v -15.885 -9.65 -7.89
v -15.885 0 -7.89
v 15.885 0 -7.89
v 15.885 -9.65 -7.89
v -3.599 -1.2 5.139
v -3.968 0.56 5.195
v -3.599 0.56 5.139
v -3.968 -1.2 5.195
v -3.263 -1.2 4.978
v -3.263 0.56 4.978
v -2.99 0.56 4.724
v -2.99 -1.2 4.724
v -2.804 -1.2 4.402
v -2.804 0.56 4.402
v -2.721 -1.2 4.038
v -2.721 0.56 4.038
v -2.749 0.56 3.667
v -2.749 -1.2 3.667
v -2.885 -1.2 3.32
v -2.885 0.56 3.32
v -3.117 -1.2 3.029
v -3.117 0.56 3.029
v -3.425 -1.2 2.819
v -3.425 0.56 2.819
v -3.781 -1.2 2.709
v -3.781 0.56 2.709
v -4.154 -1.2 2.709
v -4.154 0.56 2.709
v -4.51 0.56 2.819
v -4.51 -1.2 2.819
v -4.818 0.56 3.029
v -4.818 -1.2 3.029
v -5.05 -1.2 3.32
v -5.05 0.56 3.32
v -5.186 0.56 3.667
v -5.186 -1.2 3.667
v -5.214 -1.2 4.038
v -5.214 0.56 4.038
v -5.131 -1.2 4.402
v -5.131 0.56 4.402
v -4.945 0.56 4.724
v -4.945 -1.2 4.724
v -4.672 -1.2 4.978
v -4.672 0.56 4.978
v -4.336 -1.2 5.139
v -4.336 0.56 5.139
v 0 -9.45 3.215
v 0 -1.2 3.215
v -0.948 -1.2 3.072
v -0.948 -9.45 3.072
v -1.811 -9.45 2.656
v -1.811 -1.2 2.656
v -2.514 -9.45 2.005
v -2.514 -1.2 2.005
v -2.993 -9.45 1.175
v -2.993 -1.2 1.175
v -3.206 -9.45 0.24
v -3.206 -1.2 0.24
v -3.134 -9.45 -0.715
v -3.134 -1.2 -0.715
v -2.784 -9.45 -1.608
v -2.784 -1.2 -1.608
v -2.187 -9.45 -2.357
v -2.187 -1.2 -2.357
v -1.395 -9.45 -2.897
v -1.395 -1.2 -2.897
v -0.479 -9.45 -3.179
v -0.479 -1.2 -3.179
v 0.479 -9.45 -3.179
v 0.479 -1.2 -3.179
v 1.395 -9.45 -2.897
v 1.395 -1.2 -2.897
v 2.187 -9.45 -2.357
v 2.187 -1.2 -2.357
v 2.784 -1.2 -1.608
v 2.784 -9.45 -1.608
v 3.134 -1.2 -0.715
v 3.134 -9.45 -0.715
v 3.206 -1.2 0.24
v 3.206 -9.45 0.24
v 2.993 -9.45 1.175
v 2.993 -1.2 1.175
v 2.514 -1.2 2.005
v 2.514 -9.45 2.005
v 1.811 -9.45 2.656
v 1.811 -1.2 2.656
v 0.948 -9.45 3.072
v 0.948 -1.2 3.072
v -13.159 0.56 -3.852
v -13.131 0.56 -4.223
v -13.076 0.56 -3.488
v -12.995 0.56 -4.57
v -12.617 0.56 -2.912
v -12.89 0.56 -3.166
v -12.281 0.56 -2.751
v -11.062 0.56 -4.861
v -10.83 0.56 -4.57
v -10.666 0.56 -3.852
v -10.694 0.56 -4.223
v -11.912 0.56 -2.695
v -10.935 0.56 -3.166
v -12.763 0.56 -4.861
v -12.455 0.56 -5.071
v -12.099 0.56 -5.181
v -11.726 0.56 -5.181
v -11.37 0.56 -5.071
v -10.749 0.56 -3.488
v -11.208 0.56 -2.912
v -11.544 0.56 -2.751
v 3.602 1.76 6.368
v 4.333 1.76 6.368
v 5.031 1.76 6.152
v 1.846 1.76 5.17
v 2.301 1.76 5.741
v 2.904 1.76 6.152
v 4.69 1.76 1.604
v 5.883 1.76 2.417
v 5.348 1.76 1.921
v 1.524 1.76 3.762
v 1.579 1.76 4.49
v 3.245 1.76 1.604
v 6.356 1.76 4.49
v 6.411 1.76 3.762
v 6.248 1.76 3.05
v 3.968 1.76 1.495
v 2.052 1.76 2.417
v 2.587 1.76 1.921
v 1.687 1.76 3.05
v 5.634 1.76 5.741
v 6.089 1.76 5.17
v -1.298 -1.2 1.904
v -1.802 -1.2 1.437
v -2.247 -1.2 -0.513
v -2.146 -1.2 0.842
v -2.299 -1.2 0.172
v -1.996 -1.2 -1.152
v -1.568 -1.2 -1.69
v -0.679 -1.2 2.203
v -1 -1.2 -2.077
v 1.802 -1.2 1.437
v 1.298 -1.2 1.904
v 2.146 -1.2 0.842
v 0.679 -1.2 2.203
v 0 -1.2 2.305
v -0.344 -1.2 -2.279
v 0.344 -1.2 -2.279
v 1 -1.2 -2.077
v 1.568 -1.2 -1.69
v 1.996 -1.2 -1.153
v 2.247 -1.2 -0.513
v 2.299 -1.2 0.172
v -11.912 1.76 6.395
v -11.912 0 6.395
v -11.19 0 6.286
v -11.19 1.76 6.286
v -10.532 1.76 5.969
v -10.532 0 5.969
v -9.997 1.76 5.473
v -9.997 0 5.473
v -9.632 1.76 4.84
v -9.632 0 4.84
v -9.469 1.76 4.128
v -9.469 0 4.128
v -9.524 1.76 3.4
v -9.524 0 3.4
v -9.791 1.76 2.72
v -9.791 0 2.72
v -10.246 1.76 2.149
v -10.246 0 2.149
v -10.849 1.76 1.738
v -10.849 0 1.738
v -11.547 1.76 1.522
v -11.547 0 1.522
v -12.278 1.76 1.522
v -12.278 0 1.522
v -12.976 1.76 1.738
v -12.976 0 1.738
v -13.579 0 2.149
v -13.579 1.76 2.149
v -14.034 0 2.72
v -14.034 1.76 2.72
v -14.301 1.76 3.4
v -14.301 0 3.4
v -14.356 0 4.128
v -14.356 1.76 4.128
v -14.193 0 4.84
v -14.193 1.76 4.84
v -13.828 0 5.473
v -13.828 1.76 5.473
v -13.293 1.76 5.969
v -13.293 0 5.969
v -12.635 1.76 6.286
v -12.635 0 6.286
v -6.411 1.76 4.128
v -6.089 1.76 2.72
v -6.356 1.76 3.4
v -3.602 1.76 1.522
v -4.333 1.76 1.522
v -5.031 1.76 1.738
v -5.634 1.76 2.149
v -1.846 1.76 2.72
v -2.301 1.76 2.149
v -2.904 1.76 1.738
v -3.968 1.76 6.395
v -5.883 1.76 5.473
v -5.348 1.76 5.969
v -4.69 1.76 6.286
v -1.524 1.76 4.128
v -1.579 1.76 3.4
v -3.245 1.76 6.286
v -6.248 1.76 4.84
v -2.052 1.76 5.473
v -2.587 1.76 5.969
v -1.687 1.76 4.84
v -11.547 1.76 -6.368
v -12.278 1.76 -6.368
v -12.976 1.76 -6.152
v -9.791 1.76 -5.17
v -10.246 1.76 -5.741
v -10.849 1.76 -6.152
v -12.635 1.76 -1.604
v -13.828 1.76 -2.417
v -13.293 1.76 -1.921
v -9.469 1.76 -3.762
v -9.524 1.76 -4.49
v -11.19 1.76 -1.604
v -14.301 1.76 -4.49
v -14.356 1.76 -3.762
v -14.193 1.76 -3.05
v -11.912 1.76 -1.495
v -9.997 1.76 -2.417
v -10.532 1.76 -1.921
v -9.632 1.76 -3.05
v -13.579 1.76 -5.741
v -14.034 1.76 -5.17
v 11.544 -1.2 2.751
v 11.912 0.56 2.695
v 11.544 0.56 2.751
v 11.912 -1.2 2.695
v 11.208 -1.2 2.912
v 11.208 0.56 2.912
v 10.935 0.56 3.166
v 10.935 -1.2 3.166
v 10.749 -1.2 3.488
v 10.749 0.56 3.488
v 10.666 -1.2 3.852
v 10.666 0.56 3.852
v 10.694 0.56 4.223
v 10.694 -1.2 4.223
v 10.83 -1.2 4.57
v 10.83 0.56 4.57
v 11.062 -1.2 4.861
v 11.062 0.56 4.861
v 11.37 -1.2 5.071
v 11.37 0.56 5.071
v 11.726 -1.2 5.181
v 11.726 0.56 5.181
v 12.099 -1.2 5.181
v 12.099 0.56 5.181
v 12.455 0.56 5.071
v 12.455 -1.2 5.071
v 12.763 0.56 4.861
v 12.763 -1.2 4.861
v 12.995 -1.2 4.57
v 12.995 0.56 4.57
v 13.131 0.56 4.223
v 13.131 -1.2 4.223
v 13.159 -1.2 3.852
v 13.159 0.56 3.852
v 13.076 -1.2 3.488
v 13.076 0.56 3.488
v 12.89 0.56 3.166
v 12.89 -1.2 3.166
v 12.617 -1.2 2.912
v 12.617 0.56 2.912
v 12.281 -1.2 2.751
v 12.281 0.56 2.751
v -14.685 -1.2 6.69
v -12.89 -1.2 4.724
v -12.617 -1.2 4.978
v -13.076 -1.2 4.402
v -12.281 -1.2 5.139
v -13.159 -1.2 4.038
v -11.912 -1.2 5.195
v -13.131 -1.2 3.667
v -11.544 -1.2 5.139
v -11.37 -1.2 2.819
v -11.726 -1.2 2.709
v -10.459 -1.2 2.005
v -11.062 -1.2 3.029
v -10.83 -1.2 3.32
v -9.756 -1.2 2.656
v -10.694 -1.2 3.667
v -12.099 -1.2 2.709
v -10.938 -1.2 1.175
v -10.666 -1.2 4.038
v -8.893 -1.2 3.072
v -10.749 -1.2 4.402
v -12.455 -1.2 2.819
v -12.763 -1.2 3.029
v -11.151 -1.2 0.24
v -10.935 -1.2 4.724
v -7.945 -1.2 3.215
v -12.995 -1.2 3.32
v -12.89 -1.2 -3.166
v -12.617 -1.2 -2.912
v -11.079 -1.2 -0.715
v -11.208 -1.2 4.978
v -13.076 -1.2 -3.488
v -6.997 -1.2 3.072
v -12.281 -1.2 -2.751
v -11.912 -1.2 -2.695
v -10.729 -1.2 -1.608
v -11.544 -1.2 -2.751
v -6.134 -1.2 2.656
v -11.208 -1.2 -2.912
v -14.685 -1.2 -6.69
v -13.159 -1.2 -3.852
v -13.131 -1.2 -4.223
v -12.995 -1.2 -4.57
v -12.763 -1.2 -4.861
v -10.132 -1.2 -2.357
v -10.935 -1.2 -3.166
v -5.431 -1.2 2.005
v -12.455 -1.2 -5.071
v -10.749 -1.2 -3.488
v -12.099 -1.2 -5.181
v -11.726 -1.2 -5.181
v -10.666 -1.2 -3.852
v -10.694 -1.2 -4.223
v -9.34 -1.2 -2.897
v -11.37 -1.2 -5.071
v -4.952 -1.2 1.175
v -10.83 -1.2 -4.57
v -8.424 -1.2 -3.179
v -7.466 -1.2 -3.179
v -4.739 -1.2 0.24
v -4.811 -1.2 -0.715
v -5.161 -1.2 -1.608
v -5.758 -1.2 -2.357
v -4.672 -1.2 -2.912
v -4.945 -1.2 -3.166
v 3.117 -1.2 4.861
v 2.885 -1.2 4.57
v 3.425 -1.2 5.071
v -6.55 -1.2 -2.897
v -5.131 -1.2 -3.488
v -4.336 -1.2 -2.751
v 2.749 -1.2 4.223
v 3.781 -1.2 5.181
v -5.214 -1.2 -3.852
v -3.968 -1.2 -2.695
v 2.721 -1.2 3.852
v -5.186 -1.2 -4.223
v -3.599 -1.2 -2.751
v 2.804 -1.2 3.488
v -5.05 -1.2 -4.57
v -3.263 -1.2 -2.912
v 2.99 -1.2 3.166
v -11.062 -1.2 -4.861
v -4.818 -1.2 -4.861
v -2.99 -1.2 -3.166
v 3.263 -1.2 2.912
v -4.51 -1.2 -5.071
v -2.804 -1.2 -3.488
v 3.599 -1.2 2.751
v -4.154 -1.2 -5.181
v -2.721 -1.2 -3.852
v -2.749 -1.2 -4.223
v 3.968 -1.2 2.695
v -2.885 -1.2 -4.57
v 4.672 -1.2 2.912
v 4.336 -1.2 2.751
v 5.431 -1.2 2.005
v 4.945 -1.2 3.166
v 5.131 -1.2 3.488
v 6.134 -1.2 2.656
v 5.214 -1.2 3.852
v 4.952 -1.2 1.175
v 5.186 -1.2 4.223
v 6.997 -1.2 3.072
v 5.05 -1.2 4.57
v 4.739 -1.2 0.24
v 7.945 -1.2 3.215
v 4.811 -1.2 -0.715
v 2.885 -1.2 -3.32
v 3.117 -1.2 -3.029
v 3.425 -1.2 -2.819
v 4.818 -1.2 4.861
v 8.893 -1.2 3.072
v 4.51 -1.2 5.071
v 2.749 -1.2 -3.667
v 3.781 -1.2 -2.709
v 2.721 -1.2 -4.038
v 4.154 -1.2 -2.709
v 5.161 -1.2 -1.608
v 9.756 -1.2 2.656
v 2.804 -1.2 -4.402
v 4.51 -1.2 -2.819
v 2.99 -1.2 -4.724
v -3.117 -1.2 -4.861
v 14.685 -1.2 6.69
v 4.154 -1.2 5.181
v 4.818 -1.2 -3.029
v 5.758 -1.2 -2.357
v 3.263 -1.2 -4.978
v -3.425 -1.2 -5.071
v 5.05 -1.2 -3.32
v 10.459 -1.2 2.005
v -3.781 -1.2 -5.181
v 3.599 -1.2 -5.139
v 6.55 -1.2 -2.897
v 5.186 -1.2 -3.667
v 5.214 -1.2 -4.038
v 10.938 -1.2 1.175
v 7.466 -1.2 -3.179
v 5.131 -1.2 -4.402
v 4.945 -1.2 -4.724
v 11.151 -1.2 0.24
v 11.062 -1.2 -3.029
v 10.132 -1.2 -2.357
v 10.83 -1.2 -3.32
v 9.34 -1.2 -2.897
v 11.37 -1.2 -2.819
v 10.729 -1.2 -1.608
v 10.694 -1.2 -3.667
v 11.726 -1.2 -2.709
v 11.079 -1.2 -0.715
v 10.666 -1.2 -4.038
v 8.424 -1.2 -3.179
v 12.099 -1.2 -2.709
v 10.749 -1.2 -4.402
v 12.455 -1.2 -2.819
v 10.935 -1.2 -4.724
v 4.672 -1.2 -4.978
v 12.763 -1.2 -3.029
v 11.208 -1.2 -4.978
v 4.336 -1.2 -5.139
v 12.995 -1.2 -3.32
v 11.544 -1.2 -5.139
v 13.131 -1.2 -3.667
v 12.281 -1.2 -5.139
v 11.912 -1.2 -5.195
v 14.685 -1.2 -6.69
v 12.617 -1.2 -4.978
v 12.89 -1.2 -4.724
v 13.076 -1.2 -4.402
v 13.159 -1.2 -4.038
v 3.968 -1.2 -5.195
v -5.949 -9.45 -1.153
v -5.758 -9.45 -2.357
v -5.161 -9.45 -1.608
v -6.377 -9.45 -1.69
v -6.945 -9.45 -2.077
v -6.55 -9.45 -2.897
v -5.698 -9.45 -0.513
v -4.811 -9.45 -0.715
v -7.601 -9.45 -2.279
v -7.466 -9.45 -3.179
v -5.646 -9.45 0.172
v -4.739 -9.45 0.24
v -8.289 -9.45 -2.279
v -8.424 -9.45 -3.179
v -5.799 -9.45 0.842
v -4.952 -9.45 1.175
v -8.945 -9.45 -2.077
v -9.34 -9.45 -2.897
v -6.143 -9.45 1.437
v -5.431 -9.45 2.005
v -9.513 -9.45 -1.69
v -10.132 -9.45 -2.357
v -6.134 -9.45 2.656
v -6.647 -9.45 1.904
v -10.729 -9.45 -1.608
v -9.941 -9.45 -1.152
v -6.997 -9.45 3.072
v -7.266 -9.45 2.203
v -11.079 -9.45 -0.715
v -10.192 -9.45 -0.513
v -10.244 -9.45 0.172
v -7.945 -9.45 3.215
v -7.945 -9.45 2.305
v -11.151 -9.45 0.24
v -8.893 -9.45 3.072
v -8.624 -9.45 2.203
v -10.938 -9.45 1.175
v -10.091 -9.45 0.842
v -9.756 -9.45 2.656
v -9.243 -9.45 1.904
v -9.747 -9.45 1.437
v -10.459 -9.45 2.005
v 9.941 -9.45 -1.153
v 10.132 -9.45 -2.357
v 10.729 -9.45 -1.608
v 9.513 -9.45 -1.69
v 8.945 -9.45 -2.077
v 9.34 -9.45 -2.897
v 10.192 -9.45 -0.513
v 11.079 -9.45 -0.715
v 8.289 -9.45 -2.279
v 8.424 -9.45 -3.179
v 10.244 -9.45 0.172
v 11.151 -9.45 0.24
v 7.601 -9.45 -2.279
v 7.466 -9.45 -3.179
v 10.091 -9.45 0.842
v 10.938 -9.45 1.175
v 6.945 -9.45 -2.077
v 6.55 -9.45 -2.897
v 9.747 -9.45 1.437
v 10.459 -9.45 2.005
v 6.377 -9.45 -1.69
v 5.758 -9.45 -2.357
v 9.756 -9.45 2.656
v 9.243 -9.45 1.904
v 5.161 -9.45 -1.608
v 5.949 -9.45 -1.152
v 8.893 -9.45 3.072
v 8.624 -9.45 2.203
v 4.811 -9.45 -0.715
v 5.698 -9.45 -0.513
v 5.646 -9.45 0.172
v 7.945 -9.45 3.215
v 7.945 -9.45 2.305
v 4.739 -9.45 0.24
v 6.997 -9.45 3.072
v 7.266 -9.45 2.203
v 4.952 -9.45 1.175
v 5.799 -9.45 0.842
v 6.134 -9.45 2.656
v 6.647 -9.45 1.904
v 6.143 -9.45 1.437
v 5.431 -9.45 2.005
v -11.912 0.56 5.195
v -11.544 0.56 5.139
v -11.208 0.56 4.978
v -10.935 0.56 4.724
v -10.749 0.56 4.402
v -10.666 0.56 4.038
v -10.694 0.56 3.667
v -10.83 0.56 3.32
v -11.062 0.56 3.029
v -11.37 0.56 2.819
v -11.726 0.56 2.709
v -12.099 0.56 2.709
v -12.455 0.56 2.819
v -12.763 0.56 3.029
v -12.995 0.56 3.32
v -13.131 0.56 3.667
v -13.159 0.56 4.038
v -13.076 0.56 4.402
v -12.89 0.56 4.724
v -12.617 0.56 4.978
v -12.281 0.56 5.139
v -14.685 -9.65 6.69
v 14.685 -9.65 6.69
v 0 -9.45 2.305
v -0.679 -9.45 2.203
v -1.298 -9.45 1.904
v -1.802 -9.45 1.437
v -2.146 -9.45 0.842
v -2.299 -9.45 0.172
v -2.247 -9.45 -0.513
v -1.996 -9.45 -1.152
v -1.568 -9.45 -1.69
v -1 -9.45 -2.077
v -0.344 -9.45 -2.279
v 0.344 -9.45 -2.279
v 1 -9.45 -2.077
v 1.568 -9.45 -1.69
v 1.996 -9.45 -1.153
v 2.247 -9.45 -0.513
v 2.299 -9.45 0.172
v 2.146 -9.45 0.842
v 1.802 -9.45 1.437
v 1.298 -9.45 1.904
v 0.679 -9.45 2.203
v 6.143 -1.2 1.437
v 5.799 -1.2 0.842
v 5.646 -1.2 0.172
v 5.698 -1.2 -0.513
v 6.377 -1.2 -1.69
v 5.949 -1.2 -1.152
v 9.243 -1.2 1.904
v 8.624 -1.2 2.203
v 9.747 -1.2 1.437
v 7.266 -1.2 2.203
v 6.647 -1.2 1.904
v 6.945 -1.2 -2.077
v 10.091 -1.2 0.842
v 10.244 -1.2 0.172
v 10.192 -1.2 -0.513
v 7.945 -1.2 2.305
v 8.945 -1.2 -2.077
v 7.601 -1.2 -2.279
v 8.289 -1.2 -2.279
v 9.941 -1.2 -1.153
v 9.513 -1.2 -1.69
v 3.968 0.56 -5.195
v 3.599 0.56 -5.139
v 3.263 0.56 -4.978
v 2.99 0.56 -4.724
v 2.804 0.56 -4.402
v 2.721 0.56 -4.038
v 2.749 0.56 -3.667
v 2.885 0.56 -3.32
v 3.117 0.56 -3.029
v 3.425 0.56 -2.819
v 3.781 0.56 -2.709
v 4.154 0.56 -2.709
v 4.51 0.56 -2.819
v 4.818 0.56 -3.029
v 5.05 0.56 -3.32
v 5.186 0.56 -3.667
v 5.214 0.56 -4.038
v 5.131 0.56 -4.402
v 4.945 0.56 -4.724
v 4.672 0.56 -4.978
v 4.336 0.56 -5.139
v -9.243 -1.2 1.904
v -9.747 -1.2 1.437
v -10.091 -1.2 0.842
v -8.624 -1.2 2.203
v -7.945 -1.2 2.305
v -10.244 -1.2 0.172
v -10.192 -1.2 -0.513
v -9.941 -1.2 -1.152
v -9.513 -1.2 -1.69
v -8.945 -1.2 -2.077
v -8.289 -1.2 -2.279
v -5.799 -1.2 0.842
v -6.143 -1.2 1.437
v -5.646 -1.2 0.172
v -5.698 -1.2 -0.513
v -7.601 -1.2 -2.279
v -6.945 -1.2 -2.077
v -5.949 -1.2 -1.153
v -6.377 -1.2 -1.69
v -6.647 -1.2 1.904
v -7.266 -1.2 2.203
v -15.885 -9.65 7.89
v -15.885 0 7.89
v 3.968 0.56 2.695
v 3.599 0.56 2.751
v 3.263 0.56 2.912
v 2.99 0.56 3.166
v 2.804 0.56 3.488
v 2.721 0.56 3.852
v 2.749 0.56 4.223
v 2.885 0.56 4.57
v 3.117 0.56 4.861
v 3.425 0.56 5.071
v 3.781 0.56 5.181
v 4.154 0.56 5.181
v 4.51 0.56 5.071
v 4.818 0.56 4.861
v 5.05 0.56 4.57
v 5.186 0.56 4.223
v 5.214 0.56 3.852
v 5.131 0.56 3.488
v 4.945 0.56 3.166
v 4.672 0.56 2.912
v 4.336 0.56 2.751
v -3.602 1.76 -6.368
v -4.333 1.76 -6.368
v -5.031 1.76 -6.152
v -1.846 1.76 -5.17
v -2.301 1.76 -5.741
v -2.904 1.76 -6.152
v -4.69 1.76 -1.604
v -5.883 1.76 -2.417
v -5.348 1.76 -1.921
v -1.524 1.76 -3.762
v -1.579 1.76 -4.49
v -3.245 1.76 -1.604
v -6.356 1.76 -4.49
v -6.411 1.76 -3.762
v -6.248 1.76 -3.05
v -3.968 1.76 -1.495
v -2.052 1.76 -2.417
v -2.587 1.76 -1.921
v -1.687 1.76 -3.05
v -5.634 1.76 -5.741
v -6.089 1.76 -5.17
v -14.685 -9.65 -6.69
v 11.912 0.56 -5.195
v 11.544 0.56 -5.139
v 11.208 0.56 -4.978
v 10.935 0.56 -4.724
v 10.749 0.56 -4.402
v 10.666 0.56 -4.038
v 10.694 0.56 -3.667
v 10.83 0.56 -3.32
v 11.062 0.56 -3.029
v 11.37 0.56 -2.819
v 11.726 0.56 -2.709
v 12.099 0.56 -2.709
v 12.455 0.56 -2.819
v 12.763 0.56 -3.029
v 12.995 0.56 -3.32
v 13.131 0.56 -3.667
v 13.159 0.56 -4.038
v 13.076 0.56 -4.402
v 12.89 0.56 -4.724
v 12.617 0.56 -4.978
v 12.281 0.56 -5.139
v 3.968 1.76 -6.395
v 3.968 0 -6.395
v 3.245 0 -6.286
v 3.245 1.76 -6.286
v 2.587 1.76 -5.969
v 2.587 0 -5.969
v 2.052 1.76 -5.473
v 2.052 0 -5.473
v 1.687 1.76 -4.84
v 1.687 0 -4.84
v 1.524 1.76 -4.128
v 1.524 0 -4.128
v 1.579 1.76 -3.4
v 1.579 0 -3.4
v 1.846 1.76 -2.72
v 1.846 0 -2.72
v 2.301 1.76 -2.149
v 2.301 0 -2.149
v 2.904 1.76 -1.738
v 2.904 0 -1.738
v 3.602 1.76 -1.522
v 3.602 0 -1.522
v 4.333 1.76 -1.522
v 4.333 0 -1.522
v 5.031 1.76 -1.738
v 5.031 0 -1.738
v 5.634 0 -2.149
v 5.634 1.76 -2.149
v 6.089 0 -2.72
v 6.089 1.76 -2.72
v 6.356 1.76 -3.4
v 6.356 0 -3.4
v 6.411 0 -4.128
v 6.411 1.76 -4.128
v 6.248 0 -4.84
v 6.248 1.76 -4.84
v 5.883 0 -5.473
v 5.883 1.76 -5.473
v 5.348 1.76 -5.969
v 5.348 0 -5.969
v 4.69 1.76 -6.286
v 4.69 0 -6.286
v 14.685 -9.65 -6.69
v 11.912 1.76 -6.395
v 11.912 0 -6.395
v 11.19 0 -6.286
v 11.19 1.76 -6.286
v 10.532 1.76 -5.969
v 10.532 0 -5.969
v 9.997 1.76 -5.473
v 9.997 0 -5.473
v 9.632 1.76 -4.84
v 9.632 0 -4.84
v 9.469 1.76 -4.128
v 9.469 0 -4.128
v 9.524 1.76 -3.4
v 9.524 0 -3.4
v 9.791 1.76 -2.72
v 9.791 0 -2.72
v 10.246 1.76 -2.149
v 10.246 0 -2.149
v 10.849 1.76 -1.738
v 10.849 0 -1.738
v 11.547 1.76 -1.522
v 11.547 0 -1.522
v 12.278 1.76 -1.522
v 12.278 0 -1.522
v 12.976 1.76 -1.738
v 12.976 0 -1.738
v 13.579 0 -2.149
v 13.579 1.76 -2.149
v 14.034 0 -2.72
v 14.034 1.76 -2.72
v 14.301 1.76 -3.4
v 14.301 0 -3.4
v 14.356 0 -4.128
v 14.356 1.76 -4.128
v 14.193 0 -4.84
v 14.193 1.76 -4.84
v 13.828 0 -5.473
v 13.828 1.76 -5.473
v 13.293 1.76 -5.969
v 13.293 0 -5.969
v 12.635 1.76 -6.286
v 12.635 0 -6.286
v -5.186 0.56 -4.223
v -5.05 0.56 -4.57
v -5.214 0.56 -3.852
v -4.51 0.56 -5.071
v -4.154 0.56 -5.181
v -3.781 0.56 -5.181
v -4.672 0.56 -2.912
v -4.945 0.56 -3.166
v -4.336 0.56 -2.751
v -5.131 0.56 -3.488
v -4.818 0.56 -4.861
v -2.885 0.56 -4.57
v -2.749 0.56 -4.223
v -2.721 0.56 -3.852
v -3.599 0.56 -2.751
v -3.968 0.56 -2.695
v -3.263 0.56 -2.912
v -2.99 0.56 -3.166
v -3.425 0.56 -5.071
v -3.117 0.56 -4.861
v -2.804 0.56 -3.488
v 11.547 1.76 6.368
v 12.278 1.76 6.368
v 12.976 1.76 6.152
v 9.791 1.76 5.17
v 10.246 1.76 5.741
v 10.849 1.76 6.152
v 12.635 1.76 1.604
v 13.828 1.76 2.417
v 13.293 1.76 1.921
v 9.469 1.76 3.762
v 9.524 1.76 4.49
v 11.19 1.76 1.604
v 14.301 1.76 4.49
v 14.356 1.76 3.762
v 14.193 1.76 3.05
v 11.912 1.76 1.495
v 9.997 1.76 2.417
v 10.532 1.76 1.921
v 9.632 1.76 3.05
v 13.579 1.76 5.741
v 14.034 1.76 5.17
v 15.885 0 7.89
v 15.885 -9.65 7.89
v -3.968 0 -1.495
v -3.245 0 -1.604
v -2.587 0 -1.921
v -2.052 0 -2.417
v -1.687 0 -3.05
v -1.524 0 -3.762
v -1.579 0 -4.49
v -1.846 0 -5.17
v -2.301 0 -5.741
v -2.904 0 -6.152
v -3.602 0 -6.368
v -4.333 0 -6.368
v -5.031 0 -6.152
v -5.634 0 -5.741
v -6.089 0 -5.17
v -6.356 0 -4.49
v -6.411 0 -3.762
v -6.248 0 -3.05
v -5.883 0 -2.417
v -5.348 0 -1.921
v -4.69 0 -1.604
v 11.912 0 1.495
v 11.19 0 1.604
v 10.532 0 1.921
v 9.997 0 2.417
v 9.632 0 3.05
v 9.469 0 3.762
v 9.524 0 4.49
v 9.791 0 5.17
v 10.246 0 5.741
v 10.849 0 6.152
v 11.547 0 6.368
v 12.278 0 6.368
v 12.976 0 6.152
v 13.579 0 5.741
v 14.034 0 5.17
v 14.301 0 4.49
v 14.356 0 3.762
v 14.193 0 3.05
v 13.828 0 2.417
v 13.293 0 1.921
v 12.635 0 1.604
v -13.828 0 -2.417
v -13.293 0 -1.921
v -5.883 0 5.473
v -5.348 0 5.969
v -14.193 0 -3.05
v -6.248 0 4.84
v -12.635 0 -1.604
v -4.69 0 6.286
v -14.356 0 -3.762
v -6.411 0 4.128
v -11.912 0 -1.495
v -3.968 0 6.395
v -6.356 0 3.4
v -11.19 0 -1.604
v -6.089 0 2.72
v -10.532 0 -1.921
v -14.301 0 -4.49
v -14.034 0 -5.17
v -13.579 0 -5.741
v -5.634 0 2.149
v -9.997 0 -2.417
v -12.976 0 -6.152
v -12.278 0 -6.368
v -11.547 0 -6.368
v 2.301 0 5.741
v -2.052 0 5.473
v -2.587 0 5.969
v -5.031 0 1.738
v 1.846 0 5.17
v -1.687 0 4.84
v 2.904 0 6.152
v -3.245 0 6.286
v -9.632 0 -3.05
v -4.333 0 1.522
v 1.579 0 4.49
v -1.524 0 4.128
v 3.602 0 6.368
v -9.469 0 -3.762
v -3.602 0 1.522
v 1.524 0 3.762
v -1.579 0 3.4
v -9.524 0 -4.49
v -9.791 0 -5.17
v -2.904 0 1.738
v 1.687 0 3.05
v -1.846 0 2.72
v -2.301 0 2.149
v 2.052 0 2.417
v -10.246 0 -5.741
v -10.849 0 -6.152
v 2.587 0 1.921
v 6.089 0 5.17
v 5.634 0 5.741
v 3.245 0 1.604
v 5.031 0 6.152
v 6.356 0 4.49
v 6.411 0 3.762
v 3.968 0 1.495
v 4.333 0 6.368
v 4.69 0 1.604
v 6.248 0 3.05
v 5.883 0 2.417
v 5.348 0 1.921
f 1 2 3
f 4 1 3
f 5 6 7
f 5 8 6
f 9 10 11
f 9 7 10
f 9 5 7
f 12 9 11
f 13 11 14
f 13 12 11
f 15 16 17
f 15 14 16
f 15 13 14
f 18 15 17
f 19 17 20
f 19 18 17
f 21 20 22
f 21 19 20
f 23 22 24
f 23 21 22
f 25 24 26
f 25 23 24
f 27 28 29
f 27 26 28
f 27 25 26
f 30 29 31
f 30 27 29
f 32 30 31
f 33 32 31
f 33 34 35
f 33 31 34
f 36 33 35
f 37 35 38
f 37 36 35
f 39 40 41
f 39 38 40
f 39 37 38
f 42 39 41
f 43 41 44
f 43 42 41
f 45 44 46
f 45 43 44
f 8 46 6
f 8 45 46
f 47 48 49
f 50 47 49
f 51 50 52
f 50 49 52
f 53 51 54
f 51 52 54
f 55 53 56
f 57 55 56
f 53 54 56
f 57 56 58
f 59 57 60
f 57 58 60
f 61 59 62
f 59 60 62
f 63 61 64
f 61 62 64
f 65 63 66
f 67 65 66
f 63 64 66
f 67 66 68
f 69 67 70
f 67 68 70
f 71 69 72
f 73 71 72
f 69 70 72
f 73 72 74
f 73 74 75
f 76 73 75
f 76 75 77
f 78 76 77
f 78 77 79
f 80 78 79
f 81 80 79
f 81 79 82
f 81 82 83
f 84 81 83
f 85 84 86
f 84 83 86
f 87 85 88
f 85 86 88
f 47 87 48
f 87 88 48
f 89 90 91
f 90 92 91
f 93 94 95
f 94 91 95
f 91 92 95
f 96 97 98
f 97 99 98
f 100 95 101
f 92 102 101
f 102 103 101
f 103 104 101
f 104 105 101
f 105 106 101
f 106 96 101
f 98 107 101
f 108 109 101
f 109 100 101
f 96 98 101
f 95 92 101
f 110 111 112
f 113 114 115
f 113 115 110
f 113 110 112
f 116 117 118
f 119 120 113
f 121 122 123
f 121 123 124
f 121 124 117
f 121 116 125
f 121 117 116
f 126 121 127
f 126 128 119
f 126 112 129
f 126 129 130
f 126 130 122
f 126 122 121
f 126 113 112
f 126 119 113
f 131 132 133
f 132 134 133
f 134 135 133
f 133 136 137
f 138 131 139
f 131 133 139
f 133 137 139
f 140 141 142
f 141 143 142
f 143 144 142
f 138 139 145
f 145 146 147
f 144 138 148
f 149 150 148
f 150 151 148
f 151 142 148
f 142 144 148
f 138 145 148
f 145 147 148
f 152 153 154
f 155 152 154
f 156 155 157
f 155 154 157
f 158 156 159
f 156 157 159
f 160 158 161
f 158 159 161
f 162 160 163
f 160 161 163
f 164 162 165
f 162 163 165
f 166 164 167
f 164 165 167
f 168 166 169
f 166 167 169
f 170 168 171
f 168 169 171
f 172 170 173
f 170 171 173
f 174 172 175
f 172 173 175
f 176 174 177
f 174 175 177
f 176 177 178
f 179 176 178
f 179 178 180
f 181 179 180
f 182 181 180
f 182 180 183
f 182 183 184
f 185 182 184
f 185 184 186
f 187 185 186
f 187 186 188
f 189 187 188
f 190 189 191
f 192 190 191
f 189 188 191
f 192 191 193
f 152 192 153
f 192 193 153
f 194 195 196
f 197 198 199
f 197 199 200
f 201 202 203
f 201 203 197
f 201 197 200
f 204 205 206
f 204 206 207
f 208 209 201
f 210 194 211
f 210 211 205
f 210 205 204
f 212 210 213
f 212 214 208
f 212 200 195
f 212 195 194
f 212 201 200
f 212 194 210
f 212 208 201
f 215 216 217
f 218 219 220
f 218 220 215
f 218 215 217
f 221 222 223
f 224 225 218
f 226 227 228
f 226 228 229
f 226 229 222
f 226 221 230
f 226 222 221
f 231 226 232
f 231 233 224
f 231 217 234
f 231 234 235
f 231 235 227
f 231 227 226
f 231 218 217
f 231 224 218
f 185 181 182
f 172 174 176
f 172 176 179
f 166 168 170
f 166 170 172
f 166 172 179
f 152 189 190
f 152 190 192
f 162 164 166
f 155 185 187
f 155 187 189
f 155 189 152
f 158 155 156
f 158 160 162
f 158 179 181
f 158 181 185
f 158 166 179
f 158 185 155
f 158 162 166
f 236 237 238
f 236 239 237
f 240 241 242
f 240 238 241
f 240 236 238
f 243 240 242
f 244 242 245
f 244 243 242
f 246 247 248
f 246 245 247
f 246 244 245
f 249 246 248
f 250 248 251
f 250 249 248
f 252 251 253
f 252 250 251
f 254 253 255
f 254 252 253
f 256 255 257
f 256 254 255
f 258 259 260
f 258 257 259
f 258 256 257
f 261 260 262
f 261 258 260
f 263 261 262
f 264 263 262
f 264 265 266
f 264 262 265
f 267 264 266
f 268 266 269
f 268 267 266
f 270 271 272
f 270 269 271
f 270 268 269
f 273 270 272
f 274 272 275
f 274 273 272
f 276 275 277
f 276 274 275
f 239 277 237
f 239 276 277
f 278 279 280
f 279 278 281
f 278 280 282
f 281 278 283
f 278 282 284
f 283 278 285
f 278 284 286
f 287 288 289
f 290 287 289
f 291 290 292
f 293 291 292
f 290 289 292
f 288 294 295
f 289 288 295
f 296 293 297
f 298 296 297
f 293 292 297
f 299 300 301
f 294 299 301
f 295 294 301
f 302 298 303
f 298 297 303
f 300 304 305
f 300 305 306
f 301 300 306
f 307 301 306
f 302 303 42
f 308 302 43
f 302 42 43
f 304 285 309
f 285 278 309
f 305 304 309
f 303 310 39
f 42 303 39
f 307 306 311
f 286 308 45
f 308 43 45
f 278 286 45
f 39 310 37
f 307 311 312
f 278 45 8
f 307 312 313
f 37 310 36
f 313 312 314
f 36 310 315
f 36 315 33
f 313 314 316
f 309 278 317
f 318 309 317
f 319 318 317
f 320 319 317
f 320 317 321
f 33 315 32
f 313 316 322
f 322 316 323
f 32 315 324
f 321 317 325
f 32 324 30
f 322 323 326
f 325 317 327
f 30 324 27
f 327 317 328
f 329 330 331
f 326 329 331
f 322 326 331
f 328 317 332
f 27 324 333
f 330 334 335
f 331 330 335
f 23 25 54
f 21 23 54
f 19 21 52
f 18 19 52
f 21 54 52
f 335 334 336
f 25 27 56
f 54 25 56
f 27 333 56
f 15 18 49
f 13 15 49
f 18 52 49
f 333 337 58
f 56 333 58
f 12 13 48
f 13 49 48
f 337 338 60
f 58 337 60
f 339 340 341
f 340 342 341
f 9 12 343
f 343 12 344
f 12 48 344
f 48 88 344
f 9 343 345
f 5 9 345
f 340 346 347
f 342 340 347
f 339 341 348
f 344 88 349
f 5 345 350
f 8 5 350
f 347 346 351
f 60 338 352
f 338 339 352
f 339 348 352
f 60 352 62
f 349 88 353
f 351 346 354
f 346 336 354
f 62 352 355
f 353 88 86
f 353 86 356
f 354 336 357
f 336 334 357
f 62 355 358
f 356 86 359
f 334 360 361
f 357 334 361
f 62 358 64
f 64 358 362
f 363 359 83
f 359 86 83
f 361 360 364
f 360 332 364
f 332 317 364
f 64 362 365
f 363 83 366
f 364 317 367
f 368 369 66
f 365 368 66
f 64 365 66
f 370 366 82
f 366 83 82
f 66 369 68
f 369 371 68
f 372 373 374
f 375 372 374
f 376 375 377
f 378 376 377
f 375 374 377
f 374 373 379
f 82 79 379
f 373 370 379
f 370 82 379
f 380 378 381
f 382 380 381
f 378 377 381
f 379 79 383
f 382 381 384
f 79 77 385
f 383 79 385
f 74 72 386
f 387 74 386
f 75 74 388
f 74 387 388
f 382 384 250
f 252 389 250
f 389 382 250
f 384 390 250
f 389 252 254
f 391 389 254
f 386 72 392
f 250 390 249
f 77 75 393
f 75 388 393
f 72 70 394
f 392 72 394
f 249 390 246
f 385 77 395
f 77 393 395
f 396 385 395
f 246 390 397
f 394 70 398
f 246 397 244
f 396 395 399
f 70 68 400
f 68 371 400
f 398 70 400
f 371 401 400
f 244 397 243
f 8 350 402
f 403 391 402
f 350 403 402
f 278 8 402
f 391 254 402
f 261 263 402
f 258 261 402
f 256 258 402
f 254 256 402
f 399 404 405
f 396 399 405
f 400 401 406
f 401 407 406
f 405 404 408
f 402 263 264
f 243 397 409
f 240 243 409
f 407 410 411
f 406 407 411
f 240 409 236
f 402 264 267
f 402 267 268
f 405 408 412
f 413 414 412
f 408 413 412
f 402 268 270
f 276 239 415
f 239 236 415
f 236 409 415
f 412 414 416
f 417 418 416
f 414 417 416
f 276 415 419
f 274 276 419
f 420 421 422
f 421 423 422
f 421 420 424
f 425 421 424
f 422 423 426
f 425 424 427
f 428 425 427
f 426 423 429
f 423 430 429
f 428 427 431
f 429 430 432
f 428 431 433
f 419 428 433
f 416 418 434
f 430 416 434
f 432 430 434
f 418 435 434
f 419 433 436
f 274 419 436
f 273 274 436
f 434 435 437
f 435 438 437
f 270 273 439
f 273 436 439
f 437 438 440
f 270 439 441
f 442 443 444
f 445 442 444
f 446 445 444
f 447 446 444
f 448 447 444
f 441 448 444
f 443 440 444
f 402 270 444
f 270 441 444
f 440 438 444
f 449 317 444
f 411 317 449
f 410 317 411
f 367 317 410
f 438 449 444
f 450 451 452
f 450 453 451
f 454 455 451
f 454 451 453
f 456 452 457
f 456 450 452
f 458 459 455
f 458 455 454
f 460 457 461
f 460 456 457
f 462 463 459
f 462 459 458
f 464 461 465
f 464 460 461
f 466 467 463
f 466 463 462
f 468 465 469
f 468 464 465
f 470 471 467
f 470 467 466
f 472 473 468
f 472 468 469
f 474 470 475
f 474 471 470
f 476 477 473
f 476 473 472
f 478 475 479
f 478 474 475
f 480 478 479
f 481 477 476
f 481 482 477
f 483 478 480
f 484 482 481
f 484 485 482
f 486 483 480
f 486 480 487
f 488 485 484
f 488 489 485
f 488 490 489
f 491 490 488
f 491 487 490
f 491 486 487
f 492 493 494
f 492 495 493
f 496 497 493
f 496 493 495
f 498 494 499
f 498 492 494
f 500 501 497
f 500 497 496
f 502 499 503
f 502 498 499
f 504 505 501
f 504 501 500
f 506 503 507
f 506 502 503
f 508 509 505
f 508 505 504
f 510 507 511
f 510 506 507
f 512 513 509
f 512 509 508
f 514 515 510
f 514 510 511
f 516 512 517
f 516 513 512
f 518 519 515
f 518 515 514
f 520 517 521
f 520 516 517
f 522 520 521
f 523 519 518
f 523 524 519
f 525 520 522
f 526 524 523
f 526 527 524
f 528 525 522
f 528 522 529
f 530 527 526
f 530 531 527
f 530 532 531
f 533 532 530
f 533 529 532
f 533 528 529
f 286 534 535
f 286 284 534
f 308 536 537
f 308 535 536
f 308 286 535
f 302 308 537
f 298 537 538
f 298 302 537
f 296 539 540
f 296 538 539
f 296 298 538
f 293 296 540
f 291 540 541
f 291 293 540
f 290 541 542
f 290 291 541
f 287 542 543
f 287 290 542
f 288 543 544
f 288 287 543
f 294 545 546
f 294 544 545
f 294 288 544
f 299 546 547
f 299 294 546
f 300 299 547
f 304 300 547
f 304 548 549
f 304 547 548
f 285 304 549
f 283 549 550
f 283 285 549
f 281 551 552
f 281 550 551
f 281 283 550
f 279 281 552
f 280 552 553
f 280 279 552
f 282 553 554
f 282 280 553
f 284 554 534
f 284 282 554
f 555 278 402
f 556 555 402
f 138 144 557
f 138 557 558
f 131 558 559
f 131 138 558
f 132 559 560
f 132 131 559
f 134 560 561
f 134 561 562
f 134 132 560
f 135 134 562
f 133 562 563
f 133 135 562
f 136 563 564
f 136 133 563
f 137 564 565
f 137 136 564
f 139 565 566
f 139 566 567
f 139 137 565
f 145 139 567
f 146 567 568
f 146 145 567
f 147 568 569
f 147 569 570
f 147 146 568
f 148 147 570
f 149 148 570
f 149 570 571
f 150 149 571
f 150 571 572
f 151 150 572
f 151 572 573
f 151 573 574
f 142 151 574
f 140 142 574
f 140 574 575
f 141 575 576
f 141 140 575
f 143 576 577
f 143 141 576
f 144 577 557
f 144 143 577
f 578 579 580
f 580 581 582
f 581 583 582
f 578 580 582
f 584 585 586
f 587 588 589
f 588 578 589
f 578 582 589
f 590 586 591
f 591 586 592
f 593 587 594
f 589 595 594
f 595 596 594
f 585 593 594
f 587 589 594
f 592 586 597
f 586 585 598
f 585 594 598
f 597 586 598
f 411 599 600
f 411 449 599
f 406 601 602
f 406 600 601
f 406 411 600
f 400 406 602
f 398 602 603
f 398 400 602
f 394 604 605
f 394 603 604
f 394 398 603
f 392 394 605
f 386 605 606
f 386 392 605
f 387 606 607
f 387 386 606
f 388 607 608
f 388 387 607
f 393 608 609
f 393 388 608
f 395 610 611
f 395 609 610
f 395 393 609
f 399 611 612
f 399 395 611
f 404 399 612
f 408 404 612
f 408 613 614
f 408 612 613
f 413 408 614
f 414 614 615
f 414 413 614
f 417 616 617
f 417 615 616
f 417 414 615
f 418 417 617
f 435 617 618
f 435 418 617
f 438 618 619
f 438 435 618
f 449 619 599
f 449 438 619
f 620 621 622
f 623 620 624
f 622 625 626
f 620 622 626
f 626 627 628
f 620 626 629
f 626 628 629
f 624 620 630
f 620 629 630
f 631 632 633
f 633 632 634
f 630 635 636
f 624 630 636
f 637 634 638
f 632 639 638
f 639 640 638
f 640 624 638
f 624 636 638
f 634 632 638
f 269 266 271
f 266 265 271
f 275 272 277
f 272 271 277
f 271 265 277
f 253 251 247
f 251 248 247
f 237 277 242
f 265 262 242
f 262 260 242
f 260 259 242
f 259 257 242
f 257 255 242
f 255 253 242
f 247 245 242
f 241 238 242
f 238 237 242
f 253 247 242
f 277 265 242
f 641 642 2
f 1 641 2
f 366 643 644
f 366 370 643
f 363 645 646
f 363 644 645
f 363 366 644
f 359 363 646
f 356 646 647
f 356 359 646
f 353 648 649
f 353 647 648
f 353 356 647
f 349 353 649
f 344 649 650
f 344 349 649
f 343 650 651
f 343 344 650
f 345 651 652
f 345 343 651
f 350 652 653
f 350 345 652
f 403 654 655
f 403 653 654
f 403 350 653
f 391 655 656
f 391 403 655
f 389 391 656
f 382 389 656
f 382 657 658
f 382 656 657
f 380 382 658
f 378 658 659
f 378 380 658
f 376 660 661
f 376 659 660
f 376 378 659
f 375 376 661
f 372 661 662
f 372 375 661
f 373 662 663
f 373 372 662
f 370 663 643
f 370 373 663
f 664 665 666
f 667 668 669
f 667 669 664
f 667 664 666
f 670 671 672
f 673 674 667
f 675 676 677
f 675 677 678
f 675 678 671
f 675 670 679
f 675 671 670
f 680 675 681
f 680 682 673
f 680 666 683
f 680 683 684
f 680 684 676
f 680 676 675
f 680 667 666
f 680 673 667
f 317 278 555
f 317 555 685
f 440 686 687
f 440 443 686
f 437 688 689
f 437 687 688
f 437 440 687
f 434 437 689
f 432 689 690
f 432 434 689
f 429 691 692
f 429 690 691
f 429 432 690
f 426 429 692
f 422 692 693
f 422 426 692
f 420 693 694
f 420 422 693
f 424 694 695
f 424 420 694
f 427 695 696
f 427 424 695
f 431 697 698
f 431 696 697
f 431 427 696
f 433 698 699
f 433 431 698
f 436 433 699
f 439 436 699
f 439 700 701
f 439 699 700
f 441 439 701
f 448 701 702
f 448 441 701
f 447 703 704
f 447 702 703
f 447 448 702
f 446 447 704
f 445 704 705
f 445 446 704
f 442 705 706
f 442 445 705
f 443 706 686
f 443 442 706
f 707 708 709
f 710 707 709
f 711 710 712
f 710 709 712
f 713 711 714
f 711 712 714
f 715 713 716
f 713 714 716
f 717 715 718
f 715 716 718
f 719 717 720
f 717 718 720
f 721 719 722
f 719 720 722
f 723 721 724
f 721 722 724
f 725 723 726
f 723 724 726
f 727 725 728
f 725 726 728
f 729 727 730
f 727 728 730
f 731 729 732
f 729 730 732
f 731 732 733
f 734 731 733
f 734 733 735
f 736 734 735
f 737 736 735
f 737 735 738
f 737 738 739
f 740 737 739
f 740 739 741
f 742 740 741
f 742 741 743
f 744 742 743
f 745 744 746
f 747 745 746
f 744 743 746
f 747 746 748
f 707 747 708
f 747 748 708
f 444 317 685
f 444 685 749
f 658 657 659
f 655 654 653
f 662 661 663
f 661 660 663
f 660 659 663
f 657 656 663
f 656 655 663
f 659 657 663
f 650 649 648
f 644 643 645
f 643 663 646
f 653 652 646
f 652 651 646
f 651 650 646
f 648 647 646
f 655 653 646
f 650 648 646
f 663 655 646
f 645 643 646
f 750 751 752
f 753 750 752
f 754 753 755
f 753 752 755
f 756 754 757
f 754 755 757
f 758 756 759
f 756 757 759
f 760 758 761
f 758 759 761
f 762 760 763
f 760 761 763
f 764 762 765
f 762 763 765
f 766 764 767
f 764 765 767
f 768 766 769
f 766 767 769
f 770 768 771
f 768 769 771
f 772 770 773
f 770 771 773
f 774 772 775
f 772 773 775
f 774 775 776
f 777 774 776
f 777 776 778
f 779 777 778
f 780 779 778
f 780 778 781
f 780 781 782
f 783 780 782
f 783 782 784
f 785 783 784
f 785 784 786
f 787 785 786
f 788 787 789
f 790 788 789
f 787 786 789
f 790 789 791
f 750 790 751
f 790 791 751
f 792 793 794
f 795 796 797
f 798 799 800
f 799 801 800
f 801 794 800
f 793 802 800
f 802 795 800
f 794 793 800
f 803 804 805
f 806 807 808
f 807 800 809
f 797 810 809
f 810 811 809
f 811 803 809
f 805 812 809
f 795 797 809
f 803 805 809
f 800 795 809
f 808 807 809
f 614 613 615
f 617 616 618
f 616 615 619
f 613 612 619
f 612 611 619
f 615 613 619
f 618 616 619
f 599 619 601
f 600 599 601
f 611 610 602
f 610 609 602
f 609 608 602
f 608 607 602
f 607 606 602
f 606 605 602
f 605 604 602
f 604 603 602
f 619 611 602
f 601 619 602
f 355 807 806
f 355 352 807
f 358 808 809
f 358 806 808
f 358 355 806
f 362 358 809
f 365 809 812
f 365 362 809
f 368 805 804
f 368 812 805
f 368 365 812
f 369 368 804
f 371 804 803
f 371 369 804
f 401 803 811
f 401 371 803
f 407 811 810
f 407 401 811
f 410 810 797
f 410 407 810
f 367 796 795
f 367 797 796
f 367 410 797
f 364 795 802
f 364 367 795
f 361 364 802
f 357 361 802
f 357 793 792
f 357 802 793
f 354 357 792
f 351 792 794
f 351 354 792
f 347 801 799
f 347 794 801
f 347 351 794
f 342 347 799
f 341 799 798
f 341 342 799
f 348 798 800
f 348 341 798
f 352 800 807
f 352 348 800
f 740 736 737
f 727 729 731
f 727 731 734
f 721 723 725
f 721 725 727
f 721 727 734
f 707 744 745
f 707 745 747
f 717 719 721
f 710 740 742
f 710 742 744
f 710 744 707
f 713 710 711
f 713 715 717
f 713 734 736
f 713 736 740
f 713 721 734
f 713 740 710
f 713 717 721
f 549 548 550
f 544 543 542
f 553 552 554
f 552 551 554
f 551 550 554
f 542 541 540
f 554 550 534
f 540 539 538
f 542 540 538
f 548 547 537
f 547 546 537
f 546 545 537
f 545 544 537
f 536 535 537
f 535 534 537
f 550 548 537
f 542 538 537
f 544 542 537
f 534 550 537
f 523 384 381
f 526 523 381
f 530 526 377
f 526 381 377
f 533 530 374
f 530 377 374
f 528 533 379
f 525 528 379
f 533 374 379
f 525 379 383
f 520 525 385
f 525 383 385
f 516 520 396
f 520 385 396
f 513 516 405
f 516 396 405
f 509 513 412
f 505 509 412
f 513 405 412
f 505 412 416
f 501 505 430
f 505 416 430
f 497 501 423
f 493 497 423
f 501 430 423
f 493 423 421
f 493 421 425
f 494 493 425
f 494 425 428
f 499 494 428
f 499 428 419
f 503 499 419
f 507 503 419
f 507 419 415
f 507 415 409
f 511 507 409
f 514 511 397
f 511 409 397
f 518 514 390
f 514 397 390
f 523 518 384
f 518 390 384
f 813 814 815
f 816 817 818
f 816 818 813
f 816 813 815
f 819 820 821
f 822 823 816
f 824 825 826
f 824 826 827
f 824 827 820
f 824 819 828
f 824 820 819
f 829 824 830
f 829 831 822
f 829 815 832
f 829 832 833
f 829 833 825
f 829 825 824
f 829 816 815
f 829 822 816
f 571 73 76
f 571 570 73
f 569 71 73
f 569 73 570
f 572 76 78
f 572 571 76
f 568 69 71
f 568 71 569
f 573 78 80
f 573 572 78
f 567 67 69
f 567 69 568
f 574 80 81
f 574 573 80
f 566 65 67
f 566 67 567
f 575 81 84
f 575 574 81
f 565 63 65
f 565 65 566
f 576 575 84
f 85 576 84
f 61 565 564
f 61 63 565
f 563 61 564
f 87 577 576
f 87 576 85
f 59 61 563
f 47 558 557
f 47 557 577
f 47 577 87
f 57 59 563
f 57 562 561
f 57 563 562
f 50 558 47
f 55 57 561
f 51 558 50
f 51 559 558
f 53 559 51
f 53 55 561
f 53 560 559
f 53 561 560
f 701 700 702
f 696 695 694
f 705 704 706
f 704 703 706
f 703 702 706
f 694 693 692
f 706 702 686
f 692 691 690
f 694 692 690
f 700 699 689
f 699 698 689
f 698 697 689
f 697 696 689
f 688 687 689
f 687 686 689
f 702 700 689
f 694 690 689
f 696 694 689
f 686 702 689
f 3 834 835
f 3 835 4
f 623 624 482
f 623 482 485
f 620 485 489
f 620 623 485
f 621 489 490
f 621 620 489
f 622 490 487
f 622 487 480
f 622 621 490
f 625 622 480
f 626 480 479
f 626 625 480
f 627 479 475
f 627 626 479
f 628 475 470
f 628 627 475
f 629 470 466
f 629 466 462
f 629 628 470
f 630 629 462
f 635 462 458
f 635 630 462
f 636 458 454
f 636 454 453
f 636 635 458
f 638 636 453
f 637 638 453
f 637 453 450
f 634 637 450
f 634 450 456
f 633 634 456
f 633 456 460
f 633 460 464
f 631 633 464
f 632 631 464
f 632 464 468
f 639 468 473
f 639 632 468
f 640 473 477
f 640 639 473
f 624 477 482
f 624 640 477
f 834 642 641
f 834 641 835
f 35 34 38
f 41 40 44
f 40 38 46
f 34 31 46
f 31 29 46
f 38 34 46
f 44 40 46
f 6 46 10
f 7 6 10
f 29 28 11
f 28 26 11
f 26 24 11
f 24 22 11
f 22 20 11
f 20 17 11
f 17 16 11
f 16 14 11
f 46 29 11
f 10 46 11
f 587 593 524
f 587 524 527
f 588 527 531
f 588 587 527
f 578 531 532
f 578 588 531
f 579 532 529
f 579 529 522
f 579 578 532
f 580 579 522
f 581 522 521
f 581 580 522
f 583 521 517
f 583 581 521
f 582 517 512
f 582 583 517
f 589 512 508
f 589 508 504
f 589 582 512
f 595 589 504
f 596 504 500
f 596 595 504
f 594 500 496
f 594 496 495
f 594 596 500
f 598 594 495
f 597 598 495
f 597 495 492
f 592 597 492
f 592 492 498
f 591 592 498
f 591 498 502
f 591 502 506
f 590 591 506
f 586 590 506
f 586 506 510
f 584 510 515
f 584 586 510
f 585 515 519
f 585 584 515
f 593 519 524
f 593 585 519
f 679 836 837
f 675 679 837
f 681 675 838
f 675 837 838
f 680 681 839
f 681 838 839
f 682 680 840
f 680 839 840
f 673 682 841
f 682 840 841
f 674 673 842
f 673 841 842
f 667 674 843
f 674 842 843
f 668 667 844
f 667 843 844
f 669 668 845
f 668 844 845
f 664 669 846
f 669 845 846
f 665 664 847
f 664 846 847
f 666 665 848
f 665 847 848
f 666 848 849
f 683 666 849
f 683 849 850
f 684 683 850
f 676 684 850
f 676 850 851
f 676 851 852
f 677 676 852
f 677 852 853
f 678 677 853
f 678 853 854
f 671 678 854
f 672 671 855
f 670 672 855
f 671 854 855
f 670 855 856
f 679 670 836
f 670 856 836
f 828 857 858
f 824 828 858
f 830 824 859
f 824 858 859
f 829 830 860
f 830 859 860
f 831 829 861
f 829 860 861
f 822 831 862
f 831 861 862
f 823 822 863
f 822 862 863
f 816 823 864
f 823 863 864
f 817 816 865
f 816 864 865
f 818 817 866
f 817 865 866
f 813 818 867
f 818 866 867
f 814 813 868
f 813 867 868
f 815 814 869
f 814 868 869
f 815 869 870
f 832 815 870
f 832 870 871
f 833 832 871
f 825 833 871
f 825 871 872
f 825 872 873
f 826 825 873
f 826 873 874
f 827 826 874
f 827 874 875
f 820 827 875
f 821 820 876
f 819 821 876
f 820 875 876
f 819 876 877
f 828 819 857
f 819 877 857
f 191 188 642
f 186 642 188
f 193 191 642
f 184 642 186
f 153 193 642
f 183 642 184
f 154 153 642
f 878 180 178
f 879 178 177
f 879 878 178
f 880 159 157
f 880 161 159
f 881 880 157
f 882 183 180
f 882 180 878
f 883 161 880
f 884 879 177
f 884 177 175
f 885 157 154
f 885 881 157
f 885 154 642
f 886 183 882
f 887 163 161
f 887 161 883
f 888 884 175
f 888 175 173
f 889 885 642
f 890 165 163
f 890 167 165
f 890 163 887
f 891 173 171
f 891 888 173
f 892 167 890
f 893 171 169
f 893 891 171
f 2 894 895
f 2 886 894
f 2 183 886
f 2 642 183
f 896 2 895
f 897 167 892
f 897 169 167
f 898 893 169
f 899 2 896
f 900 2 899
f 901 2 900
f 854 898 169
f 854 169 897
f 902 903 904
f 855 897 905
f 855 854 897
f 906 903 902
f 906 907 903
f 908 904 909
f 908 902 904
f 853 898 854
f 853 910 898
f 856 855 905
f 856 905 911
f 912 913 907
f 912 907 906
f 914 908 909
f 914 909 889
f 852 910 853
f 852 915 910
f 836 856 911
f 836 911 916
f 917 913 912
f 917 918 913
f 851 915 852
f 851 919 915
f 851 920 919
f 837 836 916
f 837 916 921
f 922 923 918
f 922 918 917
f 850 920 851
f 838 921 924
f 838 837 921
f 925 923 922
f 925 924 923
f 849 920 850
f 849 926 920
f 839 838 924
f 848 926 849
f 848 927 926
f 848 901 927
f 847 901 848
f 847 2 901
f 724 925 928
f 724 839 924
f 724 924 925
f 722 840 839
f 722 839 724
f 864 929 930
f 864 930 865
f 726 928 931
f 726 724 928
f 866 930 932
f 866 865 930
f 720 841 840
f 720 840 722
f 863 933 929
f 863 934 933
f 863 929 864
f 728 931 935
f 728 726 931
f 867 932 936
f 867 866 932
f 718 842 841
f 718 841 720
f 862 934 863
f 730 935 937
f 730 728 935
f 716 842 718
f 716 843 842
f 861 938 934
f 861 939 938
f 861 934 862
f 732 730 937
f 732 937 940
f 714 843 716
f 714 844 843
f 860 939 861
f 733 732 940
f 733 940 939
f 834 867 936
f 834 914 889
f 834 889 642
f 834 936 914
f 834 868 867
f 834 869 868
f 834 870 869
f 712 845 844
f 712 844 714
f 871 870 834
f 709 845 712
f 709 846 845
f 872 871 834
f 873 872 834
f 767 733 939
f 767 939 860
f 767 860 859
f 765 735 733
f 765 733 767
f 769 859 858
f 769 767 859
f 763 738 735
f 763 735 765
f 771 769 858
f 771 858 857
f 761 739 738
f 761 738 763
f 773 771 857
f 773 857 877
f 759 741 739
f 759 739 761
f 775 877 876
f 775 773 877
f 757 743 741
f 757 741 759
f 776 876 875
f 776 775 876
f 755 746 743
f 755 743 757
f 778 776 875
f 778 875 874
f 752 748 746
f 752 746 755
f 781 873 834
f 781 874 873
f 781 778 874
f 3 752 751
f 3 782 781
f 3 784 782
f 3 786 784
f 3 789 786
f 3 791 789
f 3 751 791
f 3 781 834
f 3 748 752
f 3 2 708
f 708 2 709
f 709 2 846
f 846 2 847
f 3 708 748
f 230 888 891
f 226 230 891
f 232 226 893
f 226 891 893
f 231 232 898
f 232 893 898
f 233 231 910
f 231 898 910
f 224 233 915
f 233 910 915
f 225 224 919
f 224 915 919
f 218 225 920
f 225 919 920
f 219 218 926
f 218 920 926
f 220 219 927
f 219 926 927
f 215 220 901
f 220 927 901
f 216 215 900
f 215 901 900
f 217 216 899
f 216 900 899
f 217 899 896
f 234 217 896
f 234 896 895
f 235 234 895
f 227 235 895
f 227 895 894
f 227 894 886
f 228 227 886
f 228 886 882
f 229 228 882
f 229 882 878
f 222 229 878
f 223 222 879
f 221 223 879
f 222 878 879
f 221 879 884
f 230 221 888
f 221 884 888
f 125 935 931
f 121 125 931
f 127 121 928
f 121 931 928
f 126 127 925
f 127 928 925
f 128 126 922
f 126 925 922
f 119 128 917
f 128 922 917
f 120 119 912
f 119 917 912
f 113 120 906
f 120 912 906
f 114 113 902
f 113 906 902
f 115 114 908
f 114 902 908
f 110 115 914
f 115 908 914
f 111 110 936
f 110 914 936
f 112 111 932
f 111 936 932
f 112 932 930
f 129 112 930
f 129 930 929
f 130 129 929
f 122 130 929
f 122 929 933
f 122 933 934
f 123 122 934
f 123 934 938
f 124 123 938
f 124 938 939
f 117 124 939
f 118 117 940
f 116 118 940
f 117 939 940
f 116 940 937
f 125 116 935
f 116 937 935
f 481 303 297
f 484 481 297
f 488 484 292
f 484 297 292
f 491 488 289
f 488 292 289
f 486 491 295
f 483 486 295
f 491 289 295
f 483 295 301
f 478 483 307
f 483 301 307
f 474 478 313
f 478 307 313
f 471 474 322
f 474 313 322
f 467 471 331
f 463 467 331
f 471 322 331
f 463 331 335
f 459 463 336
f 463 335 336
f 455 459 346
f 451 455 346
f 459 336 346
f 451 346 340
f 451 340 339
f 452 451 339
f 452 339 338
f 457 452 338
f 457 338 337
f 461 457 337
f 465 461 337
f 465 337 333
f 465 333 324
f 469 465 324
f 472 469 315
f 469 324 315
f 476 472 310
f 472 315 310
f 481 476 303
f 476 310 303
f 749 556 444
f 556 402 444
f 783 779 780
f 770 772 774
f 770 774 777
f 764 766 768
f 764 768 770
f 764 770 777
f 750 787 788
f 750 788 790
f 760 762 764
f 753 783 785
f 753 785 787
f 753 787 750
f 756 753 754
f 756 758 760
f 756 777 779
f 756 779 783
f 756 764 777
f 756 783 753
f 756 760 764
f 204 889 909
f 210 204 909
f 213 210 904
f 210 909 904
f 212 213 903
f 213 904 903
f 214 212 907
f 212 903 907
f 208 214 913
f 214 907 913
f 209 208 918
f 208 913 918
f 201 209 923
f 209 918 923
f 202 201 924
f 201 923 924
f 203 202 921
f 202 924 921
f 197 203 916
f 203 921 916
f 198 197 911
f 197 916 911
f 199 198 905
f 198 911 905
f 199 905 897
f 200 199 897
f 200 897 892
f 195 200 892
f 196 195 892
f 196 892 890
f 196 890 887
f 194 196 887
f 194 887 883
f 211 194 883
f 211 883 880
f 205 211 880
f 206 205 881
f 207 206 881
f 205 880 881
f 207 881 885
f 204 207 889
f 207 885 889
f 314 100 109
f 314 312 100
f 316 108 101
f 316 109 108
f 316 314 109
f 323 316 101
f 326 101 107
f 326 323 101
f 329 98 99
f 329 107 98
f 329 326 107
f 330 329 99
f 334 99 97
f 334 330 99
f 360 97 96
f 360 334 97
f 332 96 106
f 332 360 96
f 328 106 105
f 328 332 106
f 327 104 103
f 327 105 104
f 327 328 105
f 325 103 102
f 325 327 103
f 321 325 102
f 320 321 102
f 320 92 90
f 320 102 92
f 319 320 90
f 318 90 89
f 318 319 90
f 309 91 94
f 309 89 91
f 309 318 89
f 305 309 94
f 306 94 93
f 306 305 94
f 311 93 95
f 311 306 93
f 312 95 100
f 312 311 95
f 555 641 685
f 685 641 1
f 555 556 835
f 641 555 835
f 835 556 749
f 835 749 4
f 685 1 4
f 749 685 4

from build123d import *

# Parameters (mm, degrees)
SKETCH2_W           = 31.77
SKETCH2_H           = 15.78
BOSS_EXTRUDE2_DEPTH = 9.65
SKETCH3_R           = 2.45
BOSS_EXTRUDE3_DEPTH = 1.76
SHELL1_T            = -1.2
SKETCH4_R           = 3.215
SKETCH4_R_2         = 2.305
BOSS_EXTRUDE4_DEPTH = 8.25


with BuildPart() as part:
    # Sketch2 → Boss-Extrude2 (new body)
    with BuildSketch(Plane(origin=(0, 0, 0), x_dir=(1, 0, 0), z_dir=(0, 1, 0))):
        Rectangle(SKETCH2_W, SKETCH2_H)
    extrude(amount=-BOSS_EXTRUDE2_DEPTH)

    # Sketch3 → Boss-Extrude3 (add)
    with BuildSketch(Plane(origin=(0, 0, 0), x_dir=(1, 0, 0), z_dir=(0, 1, 0))):
        with Locations(Location((-11.9125, 3.945, 0), (0, 0, 270))):
            Circle(SKETCH3_R)
        with Locations(Location((-3.9675, 3.945, 0), (0, 0, 270))):
            Circle(SKETCH3_R)
        with Locations(Location((-3.9675, -3.945, 0), (0, 0, 270))):
            Circle(SKETCH3_R)
        with Locations(Location((-11.9125, -3.945, 0), (0, 0, 270))):
            Circle(SKETCH3_R)
        with Locations(Location((11.9125, -3.945, 0), (0, 0, 90))):
            Circle(SKETCH3_R)
        with Locations(Location((3.9675, -3.945, 0), (0, 0, 90))):
            Circle(SKETCH3_R)
        with Locations(Location((3.9675, 3.945, 0), (0, 0, 90))):
            Circle(SKETCH3_R)
        with Locations(Location((11.9125, 3.945, 0), (0, 0, 90))):
            Circle(SKETCH3_R)
    extrude(amount=BOSS_EXTRUDE3_DEPTH)

    # Shell1
    shell1_openings = [part.faces().sort_by_distance(p)[0] for p in [
        (0, -9.65, 0),
    ]]
    offset(amount=SHELL1_T, openings=shell1_openings, kind=Kind.INTERSECTION)

    # Sketch4 → Boss-Extrude4 (add)
    # profile 1 of 3: a face of its own
    with BuildSketch(Plane.XZ.offset(1.2)):
        with Locations(Location((0, 0, 0), (0, 0, 90))):
            Circle(SKETCH4_R)
        with Locations(Location((0, 0, 0), (0, 0, 90))):
            Circle(SKETCH4_R_2, mode=Mode.SUBTRACT)
    # profile 2 of 3: a face of its own
    with BuildSketch(Plane.XZ.offset(1.2)):
        with Locations(Location((7.945, 0, 0), (0, 0, 90))):
            Circle(SKETCH4_R)
        with Locations(Location((7.945, 0, 0), (0, 0, 90))):
            Circle(SKETCH4_R_2, mode=Mode.SUBTRACT)
    # profile 3 of 3: a face of its own
    with BuildSketch(Plane.XZ.offset(1.2)):
        with Locations(Location((-7.945, 0, 0), (0, 0, 90))):
            Circle(SKETCH4_R)
        with Locations(Location((-7.945, 0, 0), (0, 0, 90))):
            Circle(SKETCH4_R_2, mode=Mode.SUBTRACT)
    extrude(amount=BOSS_EXTRUDE4_DEPTH)


solid = part.part
